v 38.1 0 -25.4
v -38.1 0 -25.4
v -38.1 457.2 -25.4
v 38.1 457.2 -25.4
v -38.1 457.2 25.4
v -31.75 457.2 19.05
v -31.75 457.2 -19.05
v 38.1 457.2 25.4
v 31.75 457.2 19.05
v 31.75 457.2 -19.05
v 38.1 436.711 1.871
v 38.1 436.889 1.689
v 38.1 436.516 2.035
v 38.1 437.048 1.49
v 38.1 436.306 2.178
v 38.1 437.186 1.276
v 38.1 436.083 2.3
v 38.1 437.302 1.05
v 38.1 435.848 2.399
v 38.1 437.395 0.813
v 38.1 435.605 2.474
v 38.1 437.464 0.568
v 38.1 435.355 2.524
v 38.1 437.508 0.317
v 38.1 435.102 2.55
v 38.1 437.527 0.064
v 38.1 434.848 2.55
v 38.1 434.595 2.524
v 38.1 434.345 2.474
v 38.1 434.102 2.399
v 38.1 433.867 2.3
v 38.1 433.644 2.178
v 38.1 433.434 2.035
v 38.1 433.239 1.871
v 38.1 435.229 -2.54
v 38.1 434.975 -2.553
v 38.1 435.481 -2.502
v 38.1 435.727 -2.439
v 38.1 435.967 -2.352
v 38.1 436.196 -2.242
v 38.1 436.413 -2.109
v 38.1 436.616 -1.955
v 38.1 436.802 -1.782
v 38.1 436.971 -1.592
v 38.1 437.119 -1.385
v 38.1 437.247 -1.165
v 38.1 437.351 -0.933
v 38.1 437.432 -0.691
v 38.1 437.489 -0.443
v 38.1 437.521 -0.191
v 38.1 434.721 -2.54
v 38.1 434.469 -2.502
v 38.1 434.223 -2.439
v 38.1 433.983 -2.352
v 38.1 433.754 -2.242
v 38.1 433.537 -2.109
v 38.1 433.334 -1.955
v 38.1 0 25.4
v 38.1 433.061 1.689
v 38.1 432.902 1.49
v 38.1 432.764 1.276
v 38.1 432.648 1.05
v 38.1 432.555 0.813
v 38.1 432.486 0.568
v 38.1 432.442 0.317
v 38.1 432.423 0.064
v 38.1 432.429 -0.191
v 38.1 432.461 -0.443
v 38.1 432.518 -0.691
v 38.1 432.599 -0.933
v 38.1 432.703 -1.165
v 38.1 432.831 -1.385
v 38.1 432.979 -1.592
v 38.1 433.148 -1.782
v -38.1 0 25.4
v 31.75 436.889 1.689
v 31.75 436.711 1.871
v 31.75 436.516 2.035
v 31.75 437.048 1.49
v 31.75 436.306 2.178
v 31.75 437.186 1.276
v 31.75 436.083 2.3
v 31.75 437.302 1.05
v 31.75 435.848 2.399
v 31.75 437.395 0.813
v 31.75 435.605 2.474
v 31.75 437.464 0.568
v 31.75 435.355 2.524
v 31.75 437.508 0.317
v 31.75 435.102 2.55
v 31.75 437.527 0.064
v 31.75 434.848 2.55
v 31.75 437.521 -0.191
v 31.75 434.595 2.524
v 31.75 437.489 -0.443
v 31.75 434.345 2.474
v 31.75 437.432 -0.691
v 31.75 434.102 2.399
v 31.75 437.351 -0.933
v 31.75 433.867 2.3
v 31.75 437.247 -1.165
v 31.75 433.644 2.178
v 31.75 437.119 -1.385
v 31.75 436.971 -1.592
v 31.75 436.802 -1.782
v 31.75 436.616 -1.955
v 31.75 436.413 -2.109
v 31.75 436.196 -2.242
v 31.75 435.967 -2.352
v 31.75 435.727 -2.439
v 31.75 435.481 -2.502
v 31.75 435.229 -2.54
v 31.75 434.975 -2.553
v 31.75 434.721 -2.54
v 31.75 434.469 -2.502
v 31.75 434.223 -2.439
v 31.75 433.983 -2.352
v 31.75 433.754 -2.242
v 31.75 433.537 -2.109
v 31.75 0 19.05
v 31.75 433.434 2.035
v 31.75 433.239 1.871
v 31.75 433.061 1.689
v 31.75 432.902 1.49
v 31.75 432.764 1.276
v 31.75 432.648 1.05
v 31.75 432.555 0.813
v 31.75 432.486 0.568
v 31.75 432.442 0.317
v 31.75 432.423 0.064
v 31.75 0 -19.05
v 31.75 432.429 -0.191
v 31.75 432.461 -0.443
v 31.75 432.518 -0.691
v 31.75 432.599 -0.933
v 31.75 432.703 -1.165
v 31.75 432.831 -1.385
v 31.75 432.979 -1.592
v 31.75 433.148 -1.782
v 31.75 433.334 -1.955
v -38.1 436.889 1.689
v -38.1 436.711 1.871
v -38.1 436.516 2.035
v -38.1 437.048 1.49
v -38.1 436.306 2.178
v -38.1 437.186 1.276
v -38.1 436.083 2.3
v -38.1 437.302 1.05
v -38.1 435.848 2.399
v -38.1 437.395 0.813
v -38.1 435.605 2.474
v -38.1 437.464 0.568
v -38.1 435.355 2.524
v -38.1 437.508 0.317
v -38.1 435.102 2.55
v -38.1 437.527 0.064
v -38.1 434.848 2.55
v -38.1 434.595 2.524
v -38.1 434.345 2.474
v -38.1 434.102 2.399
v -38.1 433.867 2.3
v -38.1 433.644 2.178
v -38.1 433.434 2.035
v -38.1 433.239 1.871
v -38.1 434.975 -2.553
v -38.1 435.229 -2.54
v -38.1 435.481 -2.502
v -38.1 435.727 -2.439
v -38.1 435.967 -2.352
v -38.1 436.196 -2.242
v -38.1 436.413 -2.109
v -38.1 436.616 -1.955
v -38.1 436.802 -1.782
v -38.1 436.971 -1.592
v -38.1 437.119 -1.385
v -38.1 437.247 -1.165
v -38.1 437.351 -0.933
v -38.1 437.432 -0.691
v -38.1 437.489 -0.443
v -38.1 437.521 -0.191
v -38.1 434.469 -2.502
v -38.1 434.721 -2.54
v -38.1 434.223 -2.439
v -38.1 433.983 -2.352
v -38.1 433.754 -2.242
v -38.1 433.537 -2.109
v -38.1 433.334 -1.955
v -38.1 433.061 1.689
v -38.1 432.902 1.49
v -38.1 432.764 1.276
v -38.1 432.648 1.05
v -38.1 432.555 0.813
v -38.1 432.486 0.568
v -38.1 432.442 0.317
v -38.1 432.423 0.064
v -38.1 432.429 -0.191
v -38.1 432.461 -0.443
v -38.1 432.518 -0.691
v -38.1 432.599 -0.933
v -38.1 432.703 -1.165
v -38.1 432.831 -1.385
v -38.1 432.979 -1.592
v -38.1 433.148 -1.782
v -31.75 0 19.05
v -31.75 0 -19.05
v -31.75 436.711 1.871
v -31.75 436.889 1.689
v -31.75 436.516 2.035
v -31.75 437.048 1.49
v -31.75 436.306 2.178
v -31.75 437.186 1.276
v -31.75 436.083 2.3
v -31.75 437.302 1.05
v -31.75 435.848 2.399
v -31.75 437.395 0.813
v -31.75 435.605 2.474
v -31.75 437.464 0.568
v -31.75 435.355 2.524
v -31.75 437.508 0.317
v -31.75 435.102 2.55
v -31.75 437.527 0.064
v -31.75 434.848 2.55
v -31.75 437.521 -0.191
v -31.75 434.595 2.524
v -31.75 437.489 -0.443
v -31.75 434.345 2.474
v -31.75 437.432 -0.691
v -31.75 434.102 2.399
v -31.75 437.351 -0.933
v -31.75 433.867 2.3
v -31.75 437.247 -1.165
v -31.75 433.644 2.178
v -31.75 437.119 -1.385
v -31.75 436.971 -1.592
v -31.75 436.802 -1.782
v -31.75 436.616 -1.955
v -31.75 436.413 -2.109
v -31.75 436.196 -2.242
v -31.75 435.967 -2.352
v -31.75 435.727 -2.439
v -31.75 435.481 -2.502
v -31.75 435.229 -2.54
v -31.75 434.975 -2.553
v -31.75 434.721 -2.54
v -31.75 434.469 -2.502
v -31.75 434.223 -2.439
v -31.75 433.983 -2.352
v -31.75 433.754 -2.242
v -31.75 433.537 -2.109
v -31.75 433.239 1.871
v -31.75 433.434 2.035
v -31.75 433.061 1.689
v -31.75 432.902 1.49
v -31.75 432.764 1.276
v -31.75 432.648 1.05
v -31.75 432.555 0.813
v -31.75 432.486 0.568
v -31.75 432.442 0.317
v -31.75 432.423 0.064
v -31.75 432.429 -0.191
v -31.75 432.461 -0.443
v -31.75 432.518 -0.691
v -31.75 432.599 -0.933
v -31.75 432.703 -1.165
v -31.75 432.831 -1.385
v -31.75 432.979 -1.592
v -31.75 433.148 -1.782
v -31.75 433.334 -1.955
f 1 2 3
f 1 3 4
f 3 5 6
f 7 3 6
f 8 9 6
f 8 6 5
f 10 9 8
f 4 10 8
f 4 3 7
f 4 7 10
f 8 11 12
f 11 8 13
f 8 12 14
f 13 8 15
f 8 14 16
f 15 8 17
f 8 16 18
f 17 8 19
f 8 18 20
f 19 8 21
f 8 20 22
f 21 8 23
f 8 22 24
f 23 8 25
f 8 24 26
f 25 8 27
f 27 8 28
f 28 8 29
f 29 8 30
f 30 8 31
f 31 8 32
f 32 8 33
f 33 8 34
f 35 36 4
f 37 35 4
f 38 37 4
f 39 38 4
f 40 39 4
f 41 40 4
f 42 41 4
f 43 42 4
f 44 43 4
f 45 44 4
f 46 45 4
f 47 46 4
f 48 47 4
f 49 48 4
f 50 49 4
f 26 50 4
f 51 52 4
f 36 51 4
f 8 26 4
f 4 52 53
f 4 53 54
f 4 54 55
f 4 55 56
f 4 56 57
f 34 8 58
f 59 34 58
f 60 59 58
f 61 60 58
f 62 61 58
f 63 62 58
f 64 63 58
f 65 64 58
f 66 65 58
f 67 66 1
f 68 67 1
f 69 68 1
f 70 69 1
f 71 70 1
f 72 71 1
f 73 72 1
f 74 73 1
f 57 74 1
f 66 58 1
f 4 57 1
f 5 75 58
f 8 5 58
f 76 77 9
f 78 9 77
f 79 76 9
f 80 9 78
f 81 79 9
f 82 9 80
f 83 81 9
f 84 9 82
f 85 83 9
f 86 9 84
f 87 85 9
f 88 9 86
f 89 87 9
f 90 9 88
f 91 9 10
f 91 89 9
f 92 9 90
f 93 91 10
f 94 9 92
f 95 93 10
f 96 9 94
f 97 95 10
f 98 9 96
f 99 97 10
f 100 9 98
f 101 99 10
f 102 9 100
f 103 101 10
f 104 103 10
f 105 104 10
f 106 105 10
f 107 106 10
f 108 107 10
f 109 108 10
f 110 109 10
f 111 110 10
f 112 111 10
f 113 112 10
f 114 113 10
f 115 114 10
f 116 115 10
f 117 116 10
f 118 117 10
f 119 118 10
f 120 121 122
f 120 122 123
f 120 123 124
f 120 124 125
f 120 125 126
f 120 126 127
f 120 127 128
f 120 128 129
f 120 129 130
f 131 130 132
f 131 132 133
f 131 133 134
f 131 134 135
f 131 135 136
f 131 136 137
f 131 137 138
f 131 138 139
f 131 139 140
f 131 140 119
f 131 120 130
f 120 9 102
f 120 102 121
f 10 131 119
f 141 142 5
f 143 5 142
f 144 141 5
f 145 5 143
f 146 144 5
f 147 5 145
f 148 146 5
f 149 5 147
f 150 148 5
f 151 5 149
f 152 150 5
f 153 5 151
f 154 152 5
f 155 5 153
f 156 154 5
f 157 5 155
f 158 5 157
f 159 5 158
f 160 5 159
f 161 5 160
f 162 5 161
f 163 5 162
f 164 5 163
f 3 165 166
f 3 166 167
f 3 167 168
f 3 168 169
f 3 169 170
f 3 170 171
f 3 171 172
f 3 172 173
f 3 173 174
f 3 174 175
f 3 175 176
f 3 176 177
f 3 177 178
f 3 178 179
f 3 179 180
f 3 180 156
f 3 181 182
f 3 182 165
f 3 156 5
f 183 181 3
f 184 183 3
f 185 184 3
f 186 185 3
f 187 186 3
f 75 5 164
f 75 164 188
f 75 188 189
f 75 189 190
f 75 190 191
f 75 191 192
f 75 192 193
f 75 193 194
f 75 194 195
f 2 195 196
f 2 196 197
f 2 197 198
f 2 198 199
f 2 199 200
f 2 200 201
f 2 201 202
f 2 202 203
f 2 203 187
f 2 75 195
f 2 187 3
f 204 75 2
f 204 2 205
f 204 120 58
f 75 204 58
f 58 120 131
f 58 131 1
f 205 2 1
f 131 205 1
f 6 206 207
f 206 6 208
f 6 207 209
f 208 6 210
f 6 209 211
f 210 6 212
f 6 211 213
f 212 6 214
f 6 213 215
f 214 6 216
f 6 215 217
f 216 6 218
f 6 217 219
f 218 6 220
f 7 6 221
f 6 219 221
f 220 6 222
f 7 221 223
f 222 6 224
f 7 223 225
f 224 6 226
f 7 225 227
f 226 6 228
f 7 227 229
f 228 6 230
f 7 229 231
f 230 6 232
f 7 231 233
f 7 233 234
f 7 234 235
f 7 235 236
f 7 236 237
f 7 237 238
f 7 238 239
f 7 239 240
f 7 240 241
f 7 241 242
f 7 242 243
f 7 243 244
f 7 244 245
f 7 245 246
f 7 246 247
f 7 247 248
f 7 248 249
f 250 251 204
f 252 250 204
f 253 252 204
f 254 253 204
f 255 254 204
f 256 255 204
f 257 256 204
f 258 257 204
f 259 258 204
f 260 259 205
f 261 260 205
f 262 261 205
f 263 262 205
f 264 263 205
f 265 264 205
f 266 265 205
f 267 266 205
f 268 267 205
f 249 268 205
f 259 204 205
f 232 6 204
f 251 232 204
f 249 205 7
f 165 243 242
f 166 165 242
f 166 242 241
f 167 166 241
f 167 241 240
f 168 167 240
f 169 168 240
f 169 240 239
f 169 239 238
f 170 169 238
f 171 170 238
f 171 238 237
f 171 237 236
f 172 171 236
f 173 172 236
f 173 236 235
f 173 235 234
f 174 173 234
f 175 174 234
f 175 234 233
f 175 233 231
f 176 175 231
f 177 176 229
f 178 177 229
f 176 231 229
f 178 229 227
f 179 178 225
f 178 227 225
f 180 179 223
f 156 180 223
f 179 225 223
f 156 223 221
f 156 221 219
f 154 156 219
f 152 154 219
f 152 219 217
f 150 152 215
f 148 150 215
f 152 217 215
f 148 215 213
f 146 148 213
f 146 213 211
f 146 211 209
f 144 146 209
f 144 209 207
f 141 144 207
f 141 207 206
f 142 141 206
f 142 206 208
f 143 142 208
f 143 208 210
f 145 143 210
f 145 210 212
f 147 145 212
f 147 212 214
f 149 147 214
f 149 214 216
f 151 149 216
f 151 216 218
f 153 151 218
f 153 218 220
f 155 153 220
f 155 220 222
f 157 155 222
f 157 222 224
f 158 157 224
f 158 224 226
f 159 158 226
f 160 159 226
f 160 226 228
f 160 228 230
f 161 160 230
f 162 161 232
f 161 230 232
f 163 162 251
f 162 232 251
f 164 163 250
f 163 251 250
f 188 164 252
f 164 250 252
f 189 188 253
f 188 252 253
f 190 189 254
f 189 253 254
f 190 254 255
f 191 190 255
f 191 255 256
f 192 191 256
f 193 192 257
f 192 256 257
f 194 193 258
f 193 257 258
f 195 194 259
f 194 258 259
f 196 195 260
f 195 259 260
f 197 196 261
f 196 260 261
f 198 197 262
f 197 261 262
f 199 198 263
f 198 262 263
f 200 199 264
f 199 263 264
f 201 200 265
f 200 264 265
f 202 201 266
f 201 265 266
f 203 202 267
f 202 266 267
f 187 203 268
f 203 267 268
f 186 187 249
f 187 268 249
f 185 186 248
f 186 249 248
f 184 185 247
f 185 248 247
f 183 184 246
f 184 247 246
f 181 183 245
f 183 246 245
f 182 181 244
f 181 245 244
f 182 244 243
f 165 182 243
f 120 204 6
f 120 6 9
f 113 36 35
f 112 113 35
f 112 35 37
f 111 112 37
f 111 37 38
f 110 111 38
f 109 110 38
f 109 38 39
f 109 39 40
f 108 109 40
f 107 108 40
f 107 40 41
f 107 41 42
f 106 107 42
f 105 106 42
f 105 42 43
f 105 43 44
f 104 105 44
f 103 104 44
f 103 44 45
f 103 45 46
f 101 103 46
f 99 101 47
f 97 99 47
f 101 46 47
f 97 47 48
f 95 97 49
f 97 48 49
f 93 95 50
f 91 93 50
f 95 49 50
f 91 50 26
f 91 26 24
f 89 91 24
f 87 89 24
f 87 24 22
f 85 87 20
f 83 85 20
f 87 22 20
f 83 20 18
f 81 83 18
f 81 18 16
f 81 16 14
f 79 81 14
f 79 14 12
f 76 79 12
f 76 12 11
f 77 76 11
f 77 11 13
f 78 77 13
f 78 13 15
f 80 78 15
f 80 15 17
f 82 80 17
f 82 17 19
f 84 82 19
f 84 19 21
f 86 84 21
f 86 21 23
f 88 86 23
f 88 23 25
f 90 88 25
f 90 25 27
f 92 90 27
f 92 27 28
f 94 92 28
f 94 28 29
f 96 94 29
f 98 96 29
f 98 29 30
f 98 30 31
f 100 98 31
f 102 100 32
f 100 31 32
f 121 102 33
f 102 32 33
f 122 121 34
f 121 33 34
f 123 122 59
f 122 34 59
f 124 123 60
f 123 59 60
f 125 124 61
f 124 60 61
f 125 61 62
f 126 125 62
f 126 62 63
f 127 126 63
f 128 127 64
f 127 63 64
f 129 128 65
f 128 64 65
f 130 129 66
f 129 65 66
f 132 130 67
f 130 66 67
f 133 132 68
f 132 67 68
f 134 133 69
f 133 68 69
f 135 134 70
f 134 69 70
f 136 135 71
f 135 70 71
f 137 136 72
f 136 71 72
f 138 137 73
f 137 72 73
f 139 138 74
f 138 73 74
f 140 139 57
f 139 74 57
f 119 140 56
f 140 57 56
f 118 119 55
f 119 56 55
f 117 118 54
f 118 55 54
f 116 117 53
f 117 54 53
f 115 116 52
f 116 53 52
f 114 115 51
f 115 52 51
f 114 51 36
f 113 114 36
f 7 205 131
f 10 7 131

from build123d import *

# Parameters (mm, degrees)
SKETCH1_W               = 76.2
SKETCH1_H               = 50.8
SKETCH1_W_2             = 63.5
SKETCH1_H_2             = 38.1
BOSS_EXTRUDE1_DEPTH     = 457.2
F_1_4_20_TAPPED_HOLE1_D = 5.1054


with BuildPart() as part:
    # Sketch1 → Boss-Extrude1 (new body)
    with BuildSketch(Plane(origin=(0, 0, 0), x_dir=(1, 0, 0), z_dir=(0, 1, 0))):
        Rectangle(SKETCH1_W, SKETCH1_H)
        Rectangle(SKETCH1_W_2, SKETCH1_H_2, mode=Mode.SUBTRACT)
    extrude(amount=BOSS_EXTRUDE1_DEPTH)

    # 1/4-20 Tapped Hole1 (through all)
    with Locations(Plane.ZY.offset(38.1)):
        with Locations((0, 434.975)):
            Hole(F_1_4_20_TAPPED_HOLE1_D / 2)


solid = part.part
